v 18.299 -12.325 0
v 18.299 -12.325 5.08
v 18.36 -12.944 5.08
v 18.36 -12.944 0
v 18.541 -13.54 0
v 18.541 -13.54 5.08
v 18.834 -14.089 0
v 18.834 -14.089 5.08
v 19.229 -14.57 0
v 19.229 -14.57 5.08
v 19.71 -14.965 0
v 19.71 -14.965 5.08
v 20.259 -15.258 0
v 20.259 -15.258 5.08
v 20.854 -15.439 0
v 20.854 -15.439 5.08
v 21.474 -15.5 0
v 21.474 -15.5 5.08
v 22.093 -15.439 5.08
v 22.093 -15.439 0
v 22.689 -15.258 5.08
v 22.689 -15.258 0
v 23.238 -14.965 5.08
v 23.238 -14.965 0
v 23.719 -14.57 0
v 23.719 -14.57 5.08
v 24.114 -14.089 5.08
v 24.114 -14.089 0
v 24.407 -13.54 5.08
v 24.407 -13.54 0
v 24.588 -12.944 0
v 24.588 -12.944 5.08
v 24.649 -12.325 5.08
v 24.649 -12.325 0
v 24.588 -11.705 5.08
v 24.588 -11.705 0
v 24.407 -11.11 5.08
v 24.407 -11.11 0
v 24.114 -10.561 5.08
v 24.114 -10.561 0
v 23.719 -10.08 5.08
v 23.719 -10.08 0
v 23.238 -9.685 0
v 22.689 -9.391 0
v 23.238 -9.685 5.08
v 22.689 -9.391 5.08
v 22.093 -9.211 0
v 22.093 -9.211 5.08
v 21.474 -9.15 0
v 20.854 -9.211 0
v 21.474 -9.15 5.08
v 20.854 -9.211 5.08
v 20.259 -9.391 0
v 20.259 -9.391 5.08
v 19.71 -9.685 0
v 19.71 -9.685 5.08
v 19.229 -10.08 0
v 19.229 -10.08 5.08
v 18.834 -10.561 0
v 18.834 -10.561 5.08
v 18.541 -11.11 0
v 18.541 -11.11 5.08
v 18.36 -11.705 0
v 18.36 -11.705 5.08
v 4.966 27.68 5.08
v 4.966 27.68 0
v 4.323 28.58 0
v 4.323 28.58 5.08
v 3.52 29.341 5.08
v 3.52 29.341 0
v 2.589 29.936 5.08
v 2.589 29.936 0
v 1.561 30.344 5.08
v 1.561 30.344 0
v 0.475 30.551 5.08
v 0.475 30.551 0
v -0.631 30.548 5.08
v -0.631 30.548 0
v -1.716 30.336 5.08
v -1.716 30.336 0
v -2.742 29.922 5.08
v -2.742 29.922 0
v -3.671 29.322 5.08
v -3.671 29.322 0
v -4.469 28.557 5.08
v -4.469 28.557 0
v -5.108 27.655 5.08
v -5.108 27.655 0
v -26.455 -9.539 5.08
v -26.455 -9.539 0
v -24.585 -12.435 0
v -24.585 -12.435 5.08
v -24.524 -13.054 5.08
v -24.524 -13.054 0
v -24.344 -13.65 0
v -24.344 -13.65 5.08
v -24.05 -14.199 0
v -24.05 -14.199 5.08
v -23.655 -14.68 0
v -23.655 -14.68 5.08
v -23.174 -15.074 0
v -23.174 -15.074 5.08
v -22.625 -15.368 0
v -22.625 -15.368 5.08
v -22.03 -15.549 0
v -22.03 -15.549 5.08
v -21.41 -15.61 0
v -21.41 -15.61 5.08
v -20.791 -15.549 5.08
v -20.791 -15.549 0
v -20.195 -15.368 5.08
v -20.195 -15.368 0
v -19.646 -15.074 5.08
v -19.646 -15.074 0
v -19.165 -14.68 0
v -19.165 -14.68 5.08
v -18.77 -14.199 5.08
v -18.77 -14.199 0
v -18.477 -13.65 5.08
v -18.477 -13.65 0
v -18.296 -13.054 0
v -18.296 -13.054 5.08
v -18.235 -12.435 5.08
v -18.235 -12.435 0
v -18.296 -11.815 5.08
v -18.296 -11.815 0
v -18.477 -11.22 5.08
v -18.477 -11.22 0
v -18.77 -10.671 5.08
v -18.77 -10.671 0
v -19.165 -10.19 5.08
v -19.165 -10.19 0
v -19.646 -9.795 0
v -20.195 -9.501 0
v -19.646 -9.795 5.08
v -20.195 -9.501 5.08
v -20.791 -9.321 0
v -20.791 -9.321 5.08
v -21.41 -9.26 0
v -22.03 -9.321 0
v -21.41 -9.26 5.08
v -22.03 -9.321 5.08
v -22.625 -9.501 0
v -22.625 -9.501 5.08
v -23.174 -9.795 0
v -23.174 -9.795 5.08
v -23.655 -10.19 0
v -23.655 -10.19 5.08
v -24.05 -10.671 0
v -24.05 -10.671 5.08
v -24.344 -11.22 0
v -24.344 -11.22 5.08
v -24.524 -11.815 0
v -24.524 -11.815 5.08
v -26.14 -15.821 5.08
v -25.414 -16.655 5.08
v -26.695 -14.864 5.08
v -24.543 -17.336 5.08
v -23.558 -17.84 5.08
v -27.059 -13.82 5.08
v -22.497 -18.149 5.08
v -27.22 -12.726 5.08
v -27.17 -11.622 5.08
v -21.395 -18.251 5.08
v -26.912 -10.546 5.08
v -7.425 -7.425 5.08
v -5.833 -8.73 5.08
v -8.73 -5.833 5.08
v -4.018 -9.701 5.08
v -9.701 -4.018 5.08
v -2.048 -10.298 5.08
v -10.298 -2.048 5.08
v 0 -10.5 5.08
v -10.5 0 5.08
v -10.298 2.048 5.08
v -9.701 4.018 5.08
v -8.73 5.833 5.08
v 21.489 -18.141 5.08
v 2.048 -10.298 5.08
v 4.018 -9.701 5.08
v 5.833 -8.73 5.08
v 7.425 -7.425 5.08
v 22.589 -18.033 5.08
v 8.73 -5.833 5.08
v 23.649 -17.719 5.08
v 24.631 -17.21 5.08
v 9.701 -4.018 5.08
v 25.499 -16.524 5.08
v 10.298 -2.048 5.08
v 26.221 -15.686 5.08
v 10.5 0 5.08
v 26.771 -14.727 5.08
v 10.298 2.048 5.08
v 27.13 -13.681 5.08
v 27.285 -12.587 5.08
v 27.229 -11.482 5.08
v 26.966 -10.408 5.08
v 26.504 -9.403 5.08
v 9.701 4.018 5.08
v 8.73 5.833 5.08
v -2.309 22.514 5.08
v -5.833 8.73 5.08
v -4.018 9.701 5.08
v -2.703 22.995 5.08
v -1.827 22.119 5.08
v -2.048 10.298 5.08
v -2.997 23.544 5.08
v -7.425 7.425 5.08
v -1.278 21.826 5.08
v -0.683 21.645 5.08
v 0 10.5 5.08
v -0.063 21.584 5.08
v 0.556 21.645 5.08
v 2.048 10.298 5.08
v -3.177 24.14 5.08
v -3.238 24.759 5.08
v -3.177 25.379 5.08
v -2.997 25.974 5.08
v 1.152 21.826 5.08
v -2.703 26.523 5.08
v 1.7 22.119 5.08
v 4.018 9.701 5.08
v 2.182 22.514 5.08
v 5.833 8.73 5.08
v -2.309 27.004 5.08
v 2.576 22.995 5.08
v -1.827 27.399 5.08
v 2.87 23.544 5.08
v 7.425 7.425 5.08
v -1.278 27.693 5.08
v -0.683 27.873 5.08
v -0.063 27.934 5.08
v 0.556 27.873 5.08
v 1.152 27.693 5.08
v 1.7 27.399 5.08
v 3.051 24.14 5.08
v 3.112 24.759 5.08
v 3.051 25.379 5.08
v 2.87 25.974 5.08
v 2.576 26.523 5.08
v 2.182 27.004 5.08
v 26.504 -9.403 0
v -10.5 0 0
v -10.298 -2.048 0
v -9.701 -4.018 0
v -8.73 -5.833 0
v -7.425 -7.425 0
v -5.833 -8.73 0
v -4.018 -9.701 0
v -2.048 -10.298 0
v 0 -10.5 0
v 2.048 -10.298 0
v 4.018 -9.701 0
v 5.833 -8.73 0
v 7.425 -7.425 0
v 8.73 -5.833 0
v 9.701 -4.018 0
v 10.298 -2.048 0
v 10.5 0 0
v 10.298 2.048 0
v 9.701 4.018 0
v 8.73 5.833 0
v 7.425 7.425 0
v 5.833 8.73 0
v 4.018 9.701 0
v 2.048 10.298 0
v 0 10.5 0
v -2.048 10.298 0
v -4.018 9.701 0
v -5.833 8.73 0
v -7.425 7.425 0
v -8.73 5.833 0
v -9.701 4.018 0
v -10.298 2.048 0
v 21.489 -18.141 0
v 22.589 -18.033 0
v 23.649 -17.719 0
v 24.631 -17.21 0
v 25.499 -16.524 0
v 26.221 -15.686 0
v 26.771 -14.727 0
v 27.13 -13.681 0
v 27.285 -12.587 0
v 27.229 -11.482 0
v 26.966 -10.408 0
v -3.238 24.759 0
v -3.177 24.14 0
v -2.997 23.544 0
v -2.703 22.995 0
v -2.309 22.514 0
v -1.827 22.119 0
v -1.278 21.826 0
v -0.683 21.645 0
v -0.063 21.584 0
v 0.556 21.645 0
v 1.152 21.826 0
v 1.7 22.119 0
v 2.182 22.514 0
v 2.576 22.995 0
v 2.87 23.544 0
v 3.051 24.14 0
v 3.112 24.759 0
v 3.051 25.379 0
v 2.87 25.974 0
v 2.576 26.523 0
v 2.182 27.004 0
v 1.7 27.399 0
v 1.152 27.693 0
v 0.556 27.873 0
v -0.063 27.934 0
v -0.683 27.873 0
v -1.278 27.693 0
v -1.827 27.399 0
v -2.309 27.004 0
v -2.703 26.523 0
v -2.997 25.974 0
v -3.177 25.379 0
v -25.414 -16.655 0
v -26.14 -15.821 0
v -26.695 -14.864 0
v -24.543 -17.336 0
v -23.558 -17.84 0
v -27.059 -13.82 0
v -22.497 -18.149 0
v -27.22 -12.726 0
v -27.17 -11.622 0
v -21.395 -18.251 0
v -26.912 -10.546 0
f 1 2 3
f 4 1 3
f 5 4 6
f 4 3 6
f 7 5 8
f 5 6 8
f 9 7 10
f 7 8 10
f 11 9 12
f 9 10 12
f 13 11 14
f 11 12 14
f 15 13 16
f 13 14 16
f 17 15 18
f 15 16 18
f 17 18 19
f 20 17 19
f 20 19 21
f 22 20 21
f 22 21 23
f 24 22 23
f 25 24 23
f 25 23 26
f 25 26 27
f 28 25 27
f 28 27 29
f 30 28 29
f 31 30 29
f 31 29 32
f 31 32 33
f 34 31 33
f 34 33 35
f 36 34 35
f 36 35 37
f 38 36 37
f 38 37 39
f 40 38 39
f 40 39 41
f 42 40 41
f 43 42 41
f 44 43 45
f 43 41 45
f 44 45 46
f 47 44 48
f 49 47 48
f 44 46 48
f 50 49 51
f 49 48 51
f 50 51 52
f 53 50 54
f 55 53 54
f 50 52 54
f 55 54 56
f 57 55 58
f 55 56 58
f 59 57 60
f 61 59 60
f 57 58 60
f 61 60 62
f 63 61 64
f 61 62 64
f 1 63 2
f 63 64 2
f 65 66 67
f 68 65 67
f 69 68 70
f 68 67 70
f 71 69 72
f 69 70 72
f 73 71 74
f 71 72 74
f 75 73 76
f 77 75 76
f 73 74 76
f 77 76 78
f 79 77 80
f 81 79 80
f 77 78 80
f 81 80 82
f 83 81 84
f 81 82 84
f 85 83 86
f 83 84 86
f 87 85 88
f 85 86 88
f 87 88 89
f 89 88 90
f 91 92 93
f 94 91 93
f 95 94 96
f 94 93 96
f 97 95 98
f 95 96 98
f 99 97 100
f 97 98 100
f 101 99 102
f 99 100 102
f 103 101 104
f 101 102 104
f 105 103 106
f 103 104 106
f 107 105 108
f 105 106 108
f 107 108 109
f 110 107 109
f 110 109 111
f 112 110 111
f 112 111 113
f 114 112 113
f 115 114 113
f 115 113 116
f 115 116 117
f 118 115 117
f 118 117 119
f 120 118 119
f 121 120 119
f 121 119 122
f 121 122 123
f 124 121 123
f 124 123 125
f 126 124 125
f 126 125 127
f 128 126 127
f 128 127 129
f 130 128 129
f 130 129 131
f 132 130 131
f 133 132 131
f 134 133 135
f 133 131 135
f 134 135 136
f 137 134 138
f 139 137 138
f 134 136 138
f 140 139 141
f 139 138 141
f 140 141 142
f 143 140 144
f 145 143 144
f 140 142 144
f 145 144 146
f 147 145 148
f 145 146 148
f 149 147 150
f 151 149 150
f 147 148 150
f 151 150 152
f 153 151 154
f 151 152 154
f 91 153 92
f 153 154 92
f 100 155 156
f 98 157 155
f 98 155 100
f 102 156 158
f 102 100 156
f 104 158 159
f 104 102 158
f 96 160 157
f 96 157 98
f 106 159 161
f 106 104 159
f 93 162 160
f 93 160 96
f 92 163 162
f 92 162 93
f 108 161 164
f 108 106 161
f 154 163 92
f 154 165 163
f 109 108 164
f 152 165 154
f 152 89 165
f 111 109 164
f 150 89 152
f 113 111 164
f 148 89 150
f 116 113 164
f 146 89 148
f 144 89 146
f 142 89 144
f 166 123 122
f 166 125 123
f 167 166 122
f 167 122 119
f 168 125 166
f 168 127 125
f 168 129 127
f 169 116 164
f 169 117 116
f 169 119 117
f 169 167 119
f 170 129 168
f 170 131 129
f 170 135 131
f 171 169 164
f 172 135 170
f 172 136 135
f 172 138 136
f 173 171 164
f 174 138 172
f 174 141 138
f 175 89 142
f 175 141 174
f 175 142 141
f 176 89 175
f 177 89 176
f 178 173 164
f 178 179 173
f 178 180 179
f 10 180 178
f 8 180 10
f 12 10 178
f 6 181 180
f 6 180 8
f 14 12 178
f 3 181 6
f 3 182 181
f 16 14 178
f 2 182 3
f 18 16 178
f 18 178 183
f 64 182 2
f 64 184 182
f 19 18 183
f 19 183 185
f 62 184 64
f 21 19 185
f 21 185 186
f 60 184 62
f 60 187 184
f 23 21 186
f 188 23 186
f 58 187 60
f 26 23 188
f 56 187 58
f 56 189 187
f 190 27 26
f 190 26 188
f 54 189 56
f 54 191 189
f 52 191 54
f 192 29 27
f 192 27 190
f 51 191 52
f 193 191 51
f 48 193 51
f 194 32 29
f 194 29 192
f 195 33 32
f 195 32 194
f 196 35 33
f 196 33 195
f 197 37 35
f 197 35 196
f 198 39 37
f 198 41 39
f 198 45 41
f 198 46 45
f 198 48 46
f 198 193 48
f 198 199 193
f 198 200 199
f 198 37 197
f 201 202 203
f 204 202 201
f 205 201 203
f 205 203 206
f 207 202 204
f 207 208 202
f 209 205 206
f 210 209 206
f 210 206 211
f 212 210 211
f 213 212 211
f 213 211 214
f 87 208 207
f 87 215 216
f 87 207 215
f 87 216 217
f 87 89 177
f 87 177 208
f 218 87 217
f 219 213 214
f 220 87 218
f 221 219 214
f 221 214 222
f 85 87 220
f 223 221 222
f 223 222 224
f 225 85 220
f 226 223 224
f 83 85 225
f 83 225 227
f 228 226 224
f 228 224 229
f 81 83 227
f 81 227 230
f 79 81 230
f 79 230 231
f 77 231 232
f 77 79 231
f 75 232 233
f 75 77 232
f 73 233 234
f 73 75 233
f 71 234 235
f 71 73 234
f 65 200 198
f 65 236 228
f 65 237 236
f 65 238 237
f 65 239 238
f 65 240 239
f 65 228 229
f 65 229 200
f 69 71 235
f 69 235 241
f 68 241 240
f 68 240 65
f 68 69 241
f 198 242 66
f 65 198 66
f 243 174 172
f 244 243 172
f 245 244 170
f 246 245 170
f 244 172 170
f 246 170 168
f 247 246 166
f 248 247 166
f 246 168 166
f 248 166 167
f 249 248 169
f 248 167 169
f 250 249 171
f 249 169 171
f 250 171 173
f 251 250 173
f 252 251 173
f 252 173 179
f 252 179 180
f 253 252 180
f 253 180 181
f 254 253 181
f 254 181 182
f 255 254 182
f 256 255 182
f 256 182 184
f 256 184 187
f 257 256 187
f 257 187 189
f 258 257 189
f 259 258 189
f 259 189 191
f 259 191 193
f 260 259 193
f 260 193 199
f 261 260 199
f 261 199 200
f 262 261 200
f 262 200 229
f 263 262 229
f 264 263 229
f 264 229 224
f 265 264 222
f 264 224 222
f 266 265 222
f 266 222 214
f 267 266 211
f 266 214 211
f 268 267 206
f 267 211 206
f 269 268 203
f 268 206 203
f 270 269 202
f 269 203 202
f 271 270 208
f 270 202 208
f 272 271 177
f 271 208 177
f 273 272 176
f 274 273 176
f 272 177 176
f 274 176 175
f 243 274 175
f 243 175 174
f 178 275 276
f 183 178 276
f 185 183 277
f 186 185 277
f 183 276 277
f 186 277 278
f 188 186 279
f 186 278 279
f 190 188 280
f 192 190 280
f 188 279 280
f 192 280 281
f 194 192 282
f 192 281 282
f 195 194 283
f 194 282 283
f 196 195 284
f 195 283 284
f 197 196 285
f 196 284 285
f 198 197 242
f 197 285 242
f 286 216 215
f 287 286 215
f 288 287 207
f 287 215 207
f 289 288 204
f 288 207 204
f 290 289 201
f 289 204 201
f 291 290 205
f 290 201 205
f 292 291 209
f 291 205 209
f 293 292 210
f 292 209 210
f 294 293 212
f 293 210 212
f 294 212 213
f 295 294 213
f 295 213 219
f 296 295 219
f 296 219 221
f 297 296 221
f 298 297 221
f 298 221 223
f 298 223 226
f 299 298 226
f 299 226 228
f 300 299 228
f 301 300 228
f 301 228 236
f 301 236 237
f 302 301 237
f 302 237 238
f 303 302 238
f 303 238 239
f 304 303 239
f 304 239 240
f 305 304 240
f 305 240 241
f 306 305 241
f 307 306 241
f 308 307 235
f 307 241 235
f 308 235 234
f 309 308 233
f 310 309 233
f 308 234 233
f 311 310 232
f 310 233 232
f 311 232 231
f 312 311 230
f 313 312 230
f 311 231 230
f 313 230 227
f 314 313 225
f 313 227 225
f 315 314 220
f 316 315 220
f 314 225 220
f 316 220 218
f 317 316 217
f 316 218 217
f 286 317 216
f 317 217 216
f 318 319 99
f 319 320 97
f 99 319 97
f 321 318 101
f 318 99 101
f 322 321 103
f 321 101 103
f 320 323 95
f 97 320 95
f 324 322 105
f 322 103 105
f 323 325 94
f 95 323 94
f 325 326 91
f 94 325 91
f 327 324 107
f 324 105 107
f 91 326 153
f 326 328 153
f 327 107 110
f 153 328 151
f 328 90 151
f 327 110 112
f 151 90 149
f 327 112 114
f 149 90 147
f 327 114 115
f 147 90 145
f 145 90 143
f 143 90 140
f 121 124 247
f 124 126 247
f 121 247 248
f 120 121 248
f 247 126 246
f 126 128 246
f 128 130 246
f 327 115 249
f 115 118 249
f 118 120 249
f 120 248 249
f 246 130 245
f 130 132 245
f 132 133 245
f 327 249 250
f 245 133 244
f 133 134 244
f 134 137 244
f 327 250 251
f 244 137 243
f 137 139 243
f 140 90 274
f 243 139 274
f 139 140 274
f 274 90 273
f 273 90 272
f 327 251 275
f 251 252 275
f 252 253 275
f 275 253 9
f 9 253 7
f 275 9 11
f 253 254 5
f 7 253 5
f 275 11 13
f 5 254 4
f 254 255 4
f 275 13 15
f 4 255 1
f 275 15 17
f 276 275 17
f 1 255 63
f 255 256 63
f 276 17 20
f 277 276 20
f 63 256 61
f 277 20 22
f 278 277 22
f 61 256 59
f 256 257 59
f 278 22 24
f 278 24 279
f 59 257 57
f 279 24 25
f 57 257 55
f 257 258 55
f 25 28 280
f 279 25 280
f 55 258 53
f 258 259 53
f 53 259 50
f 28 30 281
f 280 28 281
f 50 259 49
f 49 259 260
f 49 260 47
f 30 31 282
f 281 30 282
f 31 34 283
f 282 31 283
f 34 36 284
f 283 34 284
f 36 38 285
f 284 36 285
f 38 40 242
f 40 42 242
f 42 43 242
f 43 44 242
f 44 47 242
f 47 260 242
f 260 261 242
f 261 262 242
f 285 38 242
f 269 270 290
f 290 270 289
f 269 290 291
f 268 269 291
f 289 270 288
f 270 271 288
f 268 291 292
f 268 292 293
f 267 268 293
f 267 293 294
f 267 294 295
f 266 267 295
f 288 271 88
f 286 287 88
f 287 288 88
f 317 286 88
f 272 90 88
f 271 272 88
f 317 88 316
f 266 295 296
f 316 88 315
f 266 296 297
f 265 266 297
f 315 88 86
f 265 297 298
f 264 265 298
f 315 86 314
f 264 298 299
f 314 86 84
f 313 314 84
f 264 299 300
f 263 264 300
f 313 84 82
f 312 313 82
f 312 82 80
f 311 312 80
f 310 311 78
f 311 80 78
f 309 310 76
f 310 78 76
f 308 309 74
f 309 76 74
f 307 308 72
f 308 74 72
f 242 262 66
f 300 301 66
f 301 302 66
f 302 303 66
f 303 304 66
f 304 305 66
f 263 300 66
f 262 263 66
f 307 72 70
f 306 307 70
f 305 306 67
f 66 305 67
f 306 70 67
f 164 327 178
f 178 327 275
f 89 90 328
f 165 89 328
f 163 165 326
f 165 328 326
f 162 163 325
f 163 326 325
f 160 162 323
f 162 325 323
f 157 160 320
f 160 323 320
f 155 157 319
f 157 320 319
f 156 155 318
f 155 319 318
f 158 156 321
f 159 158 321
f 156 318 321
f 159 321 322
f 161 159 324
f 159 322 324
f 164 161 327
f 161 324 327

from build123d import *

# Parameters (mm, degrees)
F1_DEPTH = 5.08
F2_D     = 21
F3_D     = 6.35
F4_D     = 6.35
F5_D     = 6.35


with BuildPart() as f1:
    # F0 (on Top) → F1 (new body)
    with BuildSketch(Plane.XY):
        with BuildLine():
            Line((26.5037064396, -9.4034548087), (4.9663911618, 27.6804330928))
            ThreePointArc((4.9663911618, 27.6804330928), (-0.0783700027, 30.5758122309), (-5.1082224721, 27.6546104755))
            Line((-5.1082224721, 27.6546104755), (-26.455153827, -9.5391956352))
            ThreePointArc((-26.455153827, -9.5391956352), (-26.440245132, -15.3557765287), (-21.3954839675, -18.2511556668))
            Line((-21.3954839675, -18.2511556668), (21.4887626653, -18.1412374576))
            ThreePointArc((21.4887626653, -18.1412374576), (26.5186151347, -15.2200357022), (26.5037064396, -9.4034548087))
        make_face()
    extrude(amount=F1_DEPTH)

    # F2 (through all)
    with Locations(Plane(origin=(0, 0, 0), x_dir=(1, 0, 0), z_dir=(0, 0, -1))):
        with Locations((0, 0)):
            Hole(F2_D / 2)

    # F3 (through all)
    with Locations(Plane(origin=(0, 0, 0), x_dir=(1, 0, 0), z_dir=(0, 0, -1))):
        with Locations((-21.4103926626, 12.4345747733)):
            Hole(F3_D / 2)

    # F4 (through all)
    with Locations(Plane(origin=(0, 0, 0), x_dir=(1, 0, 0), z_dir=(0, 0, -1))):
        with Locations((21.4738539702, 12.3246565641)):
            Hole(F4_D / 2)

    # F5 (through all)
    with Locations(Plane(origin=(0, 0, 0), x_dir=(1, 0, 0), z_dir=(0, 0, -1))):
        with Locations((-0.0634613077, -24.7592313374)):
            Hole(F5_D / 2)


solid = f1.part
